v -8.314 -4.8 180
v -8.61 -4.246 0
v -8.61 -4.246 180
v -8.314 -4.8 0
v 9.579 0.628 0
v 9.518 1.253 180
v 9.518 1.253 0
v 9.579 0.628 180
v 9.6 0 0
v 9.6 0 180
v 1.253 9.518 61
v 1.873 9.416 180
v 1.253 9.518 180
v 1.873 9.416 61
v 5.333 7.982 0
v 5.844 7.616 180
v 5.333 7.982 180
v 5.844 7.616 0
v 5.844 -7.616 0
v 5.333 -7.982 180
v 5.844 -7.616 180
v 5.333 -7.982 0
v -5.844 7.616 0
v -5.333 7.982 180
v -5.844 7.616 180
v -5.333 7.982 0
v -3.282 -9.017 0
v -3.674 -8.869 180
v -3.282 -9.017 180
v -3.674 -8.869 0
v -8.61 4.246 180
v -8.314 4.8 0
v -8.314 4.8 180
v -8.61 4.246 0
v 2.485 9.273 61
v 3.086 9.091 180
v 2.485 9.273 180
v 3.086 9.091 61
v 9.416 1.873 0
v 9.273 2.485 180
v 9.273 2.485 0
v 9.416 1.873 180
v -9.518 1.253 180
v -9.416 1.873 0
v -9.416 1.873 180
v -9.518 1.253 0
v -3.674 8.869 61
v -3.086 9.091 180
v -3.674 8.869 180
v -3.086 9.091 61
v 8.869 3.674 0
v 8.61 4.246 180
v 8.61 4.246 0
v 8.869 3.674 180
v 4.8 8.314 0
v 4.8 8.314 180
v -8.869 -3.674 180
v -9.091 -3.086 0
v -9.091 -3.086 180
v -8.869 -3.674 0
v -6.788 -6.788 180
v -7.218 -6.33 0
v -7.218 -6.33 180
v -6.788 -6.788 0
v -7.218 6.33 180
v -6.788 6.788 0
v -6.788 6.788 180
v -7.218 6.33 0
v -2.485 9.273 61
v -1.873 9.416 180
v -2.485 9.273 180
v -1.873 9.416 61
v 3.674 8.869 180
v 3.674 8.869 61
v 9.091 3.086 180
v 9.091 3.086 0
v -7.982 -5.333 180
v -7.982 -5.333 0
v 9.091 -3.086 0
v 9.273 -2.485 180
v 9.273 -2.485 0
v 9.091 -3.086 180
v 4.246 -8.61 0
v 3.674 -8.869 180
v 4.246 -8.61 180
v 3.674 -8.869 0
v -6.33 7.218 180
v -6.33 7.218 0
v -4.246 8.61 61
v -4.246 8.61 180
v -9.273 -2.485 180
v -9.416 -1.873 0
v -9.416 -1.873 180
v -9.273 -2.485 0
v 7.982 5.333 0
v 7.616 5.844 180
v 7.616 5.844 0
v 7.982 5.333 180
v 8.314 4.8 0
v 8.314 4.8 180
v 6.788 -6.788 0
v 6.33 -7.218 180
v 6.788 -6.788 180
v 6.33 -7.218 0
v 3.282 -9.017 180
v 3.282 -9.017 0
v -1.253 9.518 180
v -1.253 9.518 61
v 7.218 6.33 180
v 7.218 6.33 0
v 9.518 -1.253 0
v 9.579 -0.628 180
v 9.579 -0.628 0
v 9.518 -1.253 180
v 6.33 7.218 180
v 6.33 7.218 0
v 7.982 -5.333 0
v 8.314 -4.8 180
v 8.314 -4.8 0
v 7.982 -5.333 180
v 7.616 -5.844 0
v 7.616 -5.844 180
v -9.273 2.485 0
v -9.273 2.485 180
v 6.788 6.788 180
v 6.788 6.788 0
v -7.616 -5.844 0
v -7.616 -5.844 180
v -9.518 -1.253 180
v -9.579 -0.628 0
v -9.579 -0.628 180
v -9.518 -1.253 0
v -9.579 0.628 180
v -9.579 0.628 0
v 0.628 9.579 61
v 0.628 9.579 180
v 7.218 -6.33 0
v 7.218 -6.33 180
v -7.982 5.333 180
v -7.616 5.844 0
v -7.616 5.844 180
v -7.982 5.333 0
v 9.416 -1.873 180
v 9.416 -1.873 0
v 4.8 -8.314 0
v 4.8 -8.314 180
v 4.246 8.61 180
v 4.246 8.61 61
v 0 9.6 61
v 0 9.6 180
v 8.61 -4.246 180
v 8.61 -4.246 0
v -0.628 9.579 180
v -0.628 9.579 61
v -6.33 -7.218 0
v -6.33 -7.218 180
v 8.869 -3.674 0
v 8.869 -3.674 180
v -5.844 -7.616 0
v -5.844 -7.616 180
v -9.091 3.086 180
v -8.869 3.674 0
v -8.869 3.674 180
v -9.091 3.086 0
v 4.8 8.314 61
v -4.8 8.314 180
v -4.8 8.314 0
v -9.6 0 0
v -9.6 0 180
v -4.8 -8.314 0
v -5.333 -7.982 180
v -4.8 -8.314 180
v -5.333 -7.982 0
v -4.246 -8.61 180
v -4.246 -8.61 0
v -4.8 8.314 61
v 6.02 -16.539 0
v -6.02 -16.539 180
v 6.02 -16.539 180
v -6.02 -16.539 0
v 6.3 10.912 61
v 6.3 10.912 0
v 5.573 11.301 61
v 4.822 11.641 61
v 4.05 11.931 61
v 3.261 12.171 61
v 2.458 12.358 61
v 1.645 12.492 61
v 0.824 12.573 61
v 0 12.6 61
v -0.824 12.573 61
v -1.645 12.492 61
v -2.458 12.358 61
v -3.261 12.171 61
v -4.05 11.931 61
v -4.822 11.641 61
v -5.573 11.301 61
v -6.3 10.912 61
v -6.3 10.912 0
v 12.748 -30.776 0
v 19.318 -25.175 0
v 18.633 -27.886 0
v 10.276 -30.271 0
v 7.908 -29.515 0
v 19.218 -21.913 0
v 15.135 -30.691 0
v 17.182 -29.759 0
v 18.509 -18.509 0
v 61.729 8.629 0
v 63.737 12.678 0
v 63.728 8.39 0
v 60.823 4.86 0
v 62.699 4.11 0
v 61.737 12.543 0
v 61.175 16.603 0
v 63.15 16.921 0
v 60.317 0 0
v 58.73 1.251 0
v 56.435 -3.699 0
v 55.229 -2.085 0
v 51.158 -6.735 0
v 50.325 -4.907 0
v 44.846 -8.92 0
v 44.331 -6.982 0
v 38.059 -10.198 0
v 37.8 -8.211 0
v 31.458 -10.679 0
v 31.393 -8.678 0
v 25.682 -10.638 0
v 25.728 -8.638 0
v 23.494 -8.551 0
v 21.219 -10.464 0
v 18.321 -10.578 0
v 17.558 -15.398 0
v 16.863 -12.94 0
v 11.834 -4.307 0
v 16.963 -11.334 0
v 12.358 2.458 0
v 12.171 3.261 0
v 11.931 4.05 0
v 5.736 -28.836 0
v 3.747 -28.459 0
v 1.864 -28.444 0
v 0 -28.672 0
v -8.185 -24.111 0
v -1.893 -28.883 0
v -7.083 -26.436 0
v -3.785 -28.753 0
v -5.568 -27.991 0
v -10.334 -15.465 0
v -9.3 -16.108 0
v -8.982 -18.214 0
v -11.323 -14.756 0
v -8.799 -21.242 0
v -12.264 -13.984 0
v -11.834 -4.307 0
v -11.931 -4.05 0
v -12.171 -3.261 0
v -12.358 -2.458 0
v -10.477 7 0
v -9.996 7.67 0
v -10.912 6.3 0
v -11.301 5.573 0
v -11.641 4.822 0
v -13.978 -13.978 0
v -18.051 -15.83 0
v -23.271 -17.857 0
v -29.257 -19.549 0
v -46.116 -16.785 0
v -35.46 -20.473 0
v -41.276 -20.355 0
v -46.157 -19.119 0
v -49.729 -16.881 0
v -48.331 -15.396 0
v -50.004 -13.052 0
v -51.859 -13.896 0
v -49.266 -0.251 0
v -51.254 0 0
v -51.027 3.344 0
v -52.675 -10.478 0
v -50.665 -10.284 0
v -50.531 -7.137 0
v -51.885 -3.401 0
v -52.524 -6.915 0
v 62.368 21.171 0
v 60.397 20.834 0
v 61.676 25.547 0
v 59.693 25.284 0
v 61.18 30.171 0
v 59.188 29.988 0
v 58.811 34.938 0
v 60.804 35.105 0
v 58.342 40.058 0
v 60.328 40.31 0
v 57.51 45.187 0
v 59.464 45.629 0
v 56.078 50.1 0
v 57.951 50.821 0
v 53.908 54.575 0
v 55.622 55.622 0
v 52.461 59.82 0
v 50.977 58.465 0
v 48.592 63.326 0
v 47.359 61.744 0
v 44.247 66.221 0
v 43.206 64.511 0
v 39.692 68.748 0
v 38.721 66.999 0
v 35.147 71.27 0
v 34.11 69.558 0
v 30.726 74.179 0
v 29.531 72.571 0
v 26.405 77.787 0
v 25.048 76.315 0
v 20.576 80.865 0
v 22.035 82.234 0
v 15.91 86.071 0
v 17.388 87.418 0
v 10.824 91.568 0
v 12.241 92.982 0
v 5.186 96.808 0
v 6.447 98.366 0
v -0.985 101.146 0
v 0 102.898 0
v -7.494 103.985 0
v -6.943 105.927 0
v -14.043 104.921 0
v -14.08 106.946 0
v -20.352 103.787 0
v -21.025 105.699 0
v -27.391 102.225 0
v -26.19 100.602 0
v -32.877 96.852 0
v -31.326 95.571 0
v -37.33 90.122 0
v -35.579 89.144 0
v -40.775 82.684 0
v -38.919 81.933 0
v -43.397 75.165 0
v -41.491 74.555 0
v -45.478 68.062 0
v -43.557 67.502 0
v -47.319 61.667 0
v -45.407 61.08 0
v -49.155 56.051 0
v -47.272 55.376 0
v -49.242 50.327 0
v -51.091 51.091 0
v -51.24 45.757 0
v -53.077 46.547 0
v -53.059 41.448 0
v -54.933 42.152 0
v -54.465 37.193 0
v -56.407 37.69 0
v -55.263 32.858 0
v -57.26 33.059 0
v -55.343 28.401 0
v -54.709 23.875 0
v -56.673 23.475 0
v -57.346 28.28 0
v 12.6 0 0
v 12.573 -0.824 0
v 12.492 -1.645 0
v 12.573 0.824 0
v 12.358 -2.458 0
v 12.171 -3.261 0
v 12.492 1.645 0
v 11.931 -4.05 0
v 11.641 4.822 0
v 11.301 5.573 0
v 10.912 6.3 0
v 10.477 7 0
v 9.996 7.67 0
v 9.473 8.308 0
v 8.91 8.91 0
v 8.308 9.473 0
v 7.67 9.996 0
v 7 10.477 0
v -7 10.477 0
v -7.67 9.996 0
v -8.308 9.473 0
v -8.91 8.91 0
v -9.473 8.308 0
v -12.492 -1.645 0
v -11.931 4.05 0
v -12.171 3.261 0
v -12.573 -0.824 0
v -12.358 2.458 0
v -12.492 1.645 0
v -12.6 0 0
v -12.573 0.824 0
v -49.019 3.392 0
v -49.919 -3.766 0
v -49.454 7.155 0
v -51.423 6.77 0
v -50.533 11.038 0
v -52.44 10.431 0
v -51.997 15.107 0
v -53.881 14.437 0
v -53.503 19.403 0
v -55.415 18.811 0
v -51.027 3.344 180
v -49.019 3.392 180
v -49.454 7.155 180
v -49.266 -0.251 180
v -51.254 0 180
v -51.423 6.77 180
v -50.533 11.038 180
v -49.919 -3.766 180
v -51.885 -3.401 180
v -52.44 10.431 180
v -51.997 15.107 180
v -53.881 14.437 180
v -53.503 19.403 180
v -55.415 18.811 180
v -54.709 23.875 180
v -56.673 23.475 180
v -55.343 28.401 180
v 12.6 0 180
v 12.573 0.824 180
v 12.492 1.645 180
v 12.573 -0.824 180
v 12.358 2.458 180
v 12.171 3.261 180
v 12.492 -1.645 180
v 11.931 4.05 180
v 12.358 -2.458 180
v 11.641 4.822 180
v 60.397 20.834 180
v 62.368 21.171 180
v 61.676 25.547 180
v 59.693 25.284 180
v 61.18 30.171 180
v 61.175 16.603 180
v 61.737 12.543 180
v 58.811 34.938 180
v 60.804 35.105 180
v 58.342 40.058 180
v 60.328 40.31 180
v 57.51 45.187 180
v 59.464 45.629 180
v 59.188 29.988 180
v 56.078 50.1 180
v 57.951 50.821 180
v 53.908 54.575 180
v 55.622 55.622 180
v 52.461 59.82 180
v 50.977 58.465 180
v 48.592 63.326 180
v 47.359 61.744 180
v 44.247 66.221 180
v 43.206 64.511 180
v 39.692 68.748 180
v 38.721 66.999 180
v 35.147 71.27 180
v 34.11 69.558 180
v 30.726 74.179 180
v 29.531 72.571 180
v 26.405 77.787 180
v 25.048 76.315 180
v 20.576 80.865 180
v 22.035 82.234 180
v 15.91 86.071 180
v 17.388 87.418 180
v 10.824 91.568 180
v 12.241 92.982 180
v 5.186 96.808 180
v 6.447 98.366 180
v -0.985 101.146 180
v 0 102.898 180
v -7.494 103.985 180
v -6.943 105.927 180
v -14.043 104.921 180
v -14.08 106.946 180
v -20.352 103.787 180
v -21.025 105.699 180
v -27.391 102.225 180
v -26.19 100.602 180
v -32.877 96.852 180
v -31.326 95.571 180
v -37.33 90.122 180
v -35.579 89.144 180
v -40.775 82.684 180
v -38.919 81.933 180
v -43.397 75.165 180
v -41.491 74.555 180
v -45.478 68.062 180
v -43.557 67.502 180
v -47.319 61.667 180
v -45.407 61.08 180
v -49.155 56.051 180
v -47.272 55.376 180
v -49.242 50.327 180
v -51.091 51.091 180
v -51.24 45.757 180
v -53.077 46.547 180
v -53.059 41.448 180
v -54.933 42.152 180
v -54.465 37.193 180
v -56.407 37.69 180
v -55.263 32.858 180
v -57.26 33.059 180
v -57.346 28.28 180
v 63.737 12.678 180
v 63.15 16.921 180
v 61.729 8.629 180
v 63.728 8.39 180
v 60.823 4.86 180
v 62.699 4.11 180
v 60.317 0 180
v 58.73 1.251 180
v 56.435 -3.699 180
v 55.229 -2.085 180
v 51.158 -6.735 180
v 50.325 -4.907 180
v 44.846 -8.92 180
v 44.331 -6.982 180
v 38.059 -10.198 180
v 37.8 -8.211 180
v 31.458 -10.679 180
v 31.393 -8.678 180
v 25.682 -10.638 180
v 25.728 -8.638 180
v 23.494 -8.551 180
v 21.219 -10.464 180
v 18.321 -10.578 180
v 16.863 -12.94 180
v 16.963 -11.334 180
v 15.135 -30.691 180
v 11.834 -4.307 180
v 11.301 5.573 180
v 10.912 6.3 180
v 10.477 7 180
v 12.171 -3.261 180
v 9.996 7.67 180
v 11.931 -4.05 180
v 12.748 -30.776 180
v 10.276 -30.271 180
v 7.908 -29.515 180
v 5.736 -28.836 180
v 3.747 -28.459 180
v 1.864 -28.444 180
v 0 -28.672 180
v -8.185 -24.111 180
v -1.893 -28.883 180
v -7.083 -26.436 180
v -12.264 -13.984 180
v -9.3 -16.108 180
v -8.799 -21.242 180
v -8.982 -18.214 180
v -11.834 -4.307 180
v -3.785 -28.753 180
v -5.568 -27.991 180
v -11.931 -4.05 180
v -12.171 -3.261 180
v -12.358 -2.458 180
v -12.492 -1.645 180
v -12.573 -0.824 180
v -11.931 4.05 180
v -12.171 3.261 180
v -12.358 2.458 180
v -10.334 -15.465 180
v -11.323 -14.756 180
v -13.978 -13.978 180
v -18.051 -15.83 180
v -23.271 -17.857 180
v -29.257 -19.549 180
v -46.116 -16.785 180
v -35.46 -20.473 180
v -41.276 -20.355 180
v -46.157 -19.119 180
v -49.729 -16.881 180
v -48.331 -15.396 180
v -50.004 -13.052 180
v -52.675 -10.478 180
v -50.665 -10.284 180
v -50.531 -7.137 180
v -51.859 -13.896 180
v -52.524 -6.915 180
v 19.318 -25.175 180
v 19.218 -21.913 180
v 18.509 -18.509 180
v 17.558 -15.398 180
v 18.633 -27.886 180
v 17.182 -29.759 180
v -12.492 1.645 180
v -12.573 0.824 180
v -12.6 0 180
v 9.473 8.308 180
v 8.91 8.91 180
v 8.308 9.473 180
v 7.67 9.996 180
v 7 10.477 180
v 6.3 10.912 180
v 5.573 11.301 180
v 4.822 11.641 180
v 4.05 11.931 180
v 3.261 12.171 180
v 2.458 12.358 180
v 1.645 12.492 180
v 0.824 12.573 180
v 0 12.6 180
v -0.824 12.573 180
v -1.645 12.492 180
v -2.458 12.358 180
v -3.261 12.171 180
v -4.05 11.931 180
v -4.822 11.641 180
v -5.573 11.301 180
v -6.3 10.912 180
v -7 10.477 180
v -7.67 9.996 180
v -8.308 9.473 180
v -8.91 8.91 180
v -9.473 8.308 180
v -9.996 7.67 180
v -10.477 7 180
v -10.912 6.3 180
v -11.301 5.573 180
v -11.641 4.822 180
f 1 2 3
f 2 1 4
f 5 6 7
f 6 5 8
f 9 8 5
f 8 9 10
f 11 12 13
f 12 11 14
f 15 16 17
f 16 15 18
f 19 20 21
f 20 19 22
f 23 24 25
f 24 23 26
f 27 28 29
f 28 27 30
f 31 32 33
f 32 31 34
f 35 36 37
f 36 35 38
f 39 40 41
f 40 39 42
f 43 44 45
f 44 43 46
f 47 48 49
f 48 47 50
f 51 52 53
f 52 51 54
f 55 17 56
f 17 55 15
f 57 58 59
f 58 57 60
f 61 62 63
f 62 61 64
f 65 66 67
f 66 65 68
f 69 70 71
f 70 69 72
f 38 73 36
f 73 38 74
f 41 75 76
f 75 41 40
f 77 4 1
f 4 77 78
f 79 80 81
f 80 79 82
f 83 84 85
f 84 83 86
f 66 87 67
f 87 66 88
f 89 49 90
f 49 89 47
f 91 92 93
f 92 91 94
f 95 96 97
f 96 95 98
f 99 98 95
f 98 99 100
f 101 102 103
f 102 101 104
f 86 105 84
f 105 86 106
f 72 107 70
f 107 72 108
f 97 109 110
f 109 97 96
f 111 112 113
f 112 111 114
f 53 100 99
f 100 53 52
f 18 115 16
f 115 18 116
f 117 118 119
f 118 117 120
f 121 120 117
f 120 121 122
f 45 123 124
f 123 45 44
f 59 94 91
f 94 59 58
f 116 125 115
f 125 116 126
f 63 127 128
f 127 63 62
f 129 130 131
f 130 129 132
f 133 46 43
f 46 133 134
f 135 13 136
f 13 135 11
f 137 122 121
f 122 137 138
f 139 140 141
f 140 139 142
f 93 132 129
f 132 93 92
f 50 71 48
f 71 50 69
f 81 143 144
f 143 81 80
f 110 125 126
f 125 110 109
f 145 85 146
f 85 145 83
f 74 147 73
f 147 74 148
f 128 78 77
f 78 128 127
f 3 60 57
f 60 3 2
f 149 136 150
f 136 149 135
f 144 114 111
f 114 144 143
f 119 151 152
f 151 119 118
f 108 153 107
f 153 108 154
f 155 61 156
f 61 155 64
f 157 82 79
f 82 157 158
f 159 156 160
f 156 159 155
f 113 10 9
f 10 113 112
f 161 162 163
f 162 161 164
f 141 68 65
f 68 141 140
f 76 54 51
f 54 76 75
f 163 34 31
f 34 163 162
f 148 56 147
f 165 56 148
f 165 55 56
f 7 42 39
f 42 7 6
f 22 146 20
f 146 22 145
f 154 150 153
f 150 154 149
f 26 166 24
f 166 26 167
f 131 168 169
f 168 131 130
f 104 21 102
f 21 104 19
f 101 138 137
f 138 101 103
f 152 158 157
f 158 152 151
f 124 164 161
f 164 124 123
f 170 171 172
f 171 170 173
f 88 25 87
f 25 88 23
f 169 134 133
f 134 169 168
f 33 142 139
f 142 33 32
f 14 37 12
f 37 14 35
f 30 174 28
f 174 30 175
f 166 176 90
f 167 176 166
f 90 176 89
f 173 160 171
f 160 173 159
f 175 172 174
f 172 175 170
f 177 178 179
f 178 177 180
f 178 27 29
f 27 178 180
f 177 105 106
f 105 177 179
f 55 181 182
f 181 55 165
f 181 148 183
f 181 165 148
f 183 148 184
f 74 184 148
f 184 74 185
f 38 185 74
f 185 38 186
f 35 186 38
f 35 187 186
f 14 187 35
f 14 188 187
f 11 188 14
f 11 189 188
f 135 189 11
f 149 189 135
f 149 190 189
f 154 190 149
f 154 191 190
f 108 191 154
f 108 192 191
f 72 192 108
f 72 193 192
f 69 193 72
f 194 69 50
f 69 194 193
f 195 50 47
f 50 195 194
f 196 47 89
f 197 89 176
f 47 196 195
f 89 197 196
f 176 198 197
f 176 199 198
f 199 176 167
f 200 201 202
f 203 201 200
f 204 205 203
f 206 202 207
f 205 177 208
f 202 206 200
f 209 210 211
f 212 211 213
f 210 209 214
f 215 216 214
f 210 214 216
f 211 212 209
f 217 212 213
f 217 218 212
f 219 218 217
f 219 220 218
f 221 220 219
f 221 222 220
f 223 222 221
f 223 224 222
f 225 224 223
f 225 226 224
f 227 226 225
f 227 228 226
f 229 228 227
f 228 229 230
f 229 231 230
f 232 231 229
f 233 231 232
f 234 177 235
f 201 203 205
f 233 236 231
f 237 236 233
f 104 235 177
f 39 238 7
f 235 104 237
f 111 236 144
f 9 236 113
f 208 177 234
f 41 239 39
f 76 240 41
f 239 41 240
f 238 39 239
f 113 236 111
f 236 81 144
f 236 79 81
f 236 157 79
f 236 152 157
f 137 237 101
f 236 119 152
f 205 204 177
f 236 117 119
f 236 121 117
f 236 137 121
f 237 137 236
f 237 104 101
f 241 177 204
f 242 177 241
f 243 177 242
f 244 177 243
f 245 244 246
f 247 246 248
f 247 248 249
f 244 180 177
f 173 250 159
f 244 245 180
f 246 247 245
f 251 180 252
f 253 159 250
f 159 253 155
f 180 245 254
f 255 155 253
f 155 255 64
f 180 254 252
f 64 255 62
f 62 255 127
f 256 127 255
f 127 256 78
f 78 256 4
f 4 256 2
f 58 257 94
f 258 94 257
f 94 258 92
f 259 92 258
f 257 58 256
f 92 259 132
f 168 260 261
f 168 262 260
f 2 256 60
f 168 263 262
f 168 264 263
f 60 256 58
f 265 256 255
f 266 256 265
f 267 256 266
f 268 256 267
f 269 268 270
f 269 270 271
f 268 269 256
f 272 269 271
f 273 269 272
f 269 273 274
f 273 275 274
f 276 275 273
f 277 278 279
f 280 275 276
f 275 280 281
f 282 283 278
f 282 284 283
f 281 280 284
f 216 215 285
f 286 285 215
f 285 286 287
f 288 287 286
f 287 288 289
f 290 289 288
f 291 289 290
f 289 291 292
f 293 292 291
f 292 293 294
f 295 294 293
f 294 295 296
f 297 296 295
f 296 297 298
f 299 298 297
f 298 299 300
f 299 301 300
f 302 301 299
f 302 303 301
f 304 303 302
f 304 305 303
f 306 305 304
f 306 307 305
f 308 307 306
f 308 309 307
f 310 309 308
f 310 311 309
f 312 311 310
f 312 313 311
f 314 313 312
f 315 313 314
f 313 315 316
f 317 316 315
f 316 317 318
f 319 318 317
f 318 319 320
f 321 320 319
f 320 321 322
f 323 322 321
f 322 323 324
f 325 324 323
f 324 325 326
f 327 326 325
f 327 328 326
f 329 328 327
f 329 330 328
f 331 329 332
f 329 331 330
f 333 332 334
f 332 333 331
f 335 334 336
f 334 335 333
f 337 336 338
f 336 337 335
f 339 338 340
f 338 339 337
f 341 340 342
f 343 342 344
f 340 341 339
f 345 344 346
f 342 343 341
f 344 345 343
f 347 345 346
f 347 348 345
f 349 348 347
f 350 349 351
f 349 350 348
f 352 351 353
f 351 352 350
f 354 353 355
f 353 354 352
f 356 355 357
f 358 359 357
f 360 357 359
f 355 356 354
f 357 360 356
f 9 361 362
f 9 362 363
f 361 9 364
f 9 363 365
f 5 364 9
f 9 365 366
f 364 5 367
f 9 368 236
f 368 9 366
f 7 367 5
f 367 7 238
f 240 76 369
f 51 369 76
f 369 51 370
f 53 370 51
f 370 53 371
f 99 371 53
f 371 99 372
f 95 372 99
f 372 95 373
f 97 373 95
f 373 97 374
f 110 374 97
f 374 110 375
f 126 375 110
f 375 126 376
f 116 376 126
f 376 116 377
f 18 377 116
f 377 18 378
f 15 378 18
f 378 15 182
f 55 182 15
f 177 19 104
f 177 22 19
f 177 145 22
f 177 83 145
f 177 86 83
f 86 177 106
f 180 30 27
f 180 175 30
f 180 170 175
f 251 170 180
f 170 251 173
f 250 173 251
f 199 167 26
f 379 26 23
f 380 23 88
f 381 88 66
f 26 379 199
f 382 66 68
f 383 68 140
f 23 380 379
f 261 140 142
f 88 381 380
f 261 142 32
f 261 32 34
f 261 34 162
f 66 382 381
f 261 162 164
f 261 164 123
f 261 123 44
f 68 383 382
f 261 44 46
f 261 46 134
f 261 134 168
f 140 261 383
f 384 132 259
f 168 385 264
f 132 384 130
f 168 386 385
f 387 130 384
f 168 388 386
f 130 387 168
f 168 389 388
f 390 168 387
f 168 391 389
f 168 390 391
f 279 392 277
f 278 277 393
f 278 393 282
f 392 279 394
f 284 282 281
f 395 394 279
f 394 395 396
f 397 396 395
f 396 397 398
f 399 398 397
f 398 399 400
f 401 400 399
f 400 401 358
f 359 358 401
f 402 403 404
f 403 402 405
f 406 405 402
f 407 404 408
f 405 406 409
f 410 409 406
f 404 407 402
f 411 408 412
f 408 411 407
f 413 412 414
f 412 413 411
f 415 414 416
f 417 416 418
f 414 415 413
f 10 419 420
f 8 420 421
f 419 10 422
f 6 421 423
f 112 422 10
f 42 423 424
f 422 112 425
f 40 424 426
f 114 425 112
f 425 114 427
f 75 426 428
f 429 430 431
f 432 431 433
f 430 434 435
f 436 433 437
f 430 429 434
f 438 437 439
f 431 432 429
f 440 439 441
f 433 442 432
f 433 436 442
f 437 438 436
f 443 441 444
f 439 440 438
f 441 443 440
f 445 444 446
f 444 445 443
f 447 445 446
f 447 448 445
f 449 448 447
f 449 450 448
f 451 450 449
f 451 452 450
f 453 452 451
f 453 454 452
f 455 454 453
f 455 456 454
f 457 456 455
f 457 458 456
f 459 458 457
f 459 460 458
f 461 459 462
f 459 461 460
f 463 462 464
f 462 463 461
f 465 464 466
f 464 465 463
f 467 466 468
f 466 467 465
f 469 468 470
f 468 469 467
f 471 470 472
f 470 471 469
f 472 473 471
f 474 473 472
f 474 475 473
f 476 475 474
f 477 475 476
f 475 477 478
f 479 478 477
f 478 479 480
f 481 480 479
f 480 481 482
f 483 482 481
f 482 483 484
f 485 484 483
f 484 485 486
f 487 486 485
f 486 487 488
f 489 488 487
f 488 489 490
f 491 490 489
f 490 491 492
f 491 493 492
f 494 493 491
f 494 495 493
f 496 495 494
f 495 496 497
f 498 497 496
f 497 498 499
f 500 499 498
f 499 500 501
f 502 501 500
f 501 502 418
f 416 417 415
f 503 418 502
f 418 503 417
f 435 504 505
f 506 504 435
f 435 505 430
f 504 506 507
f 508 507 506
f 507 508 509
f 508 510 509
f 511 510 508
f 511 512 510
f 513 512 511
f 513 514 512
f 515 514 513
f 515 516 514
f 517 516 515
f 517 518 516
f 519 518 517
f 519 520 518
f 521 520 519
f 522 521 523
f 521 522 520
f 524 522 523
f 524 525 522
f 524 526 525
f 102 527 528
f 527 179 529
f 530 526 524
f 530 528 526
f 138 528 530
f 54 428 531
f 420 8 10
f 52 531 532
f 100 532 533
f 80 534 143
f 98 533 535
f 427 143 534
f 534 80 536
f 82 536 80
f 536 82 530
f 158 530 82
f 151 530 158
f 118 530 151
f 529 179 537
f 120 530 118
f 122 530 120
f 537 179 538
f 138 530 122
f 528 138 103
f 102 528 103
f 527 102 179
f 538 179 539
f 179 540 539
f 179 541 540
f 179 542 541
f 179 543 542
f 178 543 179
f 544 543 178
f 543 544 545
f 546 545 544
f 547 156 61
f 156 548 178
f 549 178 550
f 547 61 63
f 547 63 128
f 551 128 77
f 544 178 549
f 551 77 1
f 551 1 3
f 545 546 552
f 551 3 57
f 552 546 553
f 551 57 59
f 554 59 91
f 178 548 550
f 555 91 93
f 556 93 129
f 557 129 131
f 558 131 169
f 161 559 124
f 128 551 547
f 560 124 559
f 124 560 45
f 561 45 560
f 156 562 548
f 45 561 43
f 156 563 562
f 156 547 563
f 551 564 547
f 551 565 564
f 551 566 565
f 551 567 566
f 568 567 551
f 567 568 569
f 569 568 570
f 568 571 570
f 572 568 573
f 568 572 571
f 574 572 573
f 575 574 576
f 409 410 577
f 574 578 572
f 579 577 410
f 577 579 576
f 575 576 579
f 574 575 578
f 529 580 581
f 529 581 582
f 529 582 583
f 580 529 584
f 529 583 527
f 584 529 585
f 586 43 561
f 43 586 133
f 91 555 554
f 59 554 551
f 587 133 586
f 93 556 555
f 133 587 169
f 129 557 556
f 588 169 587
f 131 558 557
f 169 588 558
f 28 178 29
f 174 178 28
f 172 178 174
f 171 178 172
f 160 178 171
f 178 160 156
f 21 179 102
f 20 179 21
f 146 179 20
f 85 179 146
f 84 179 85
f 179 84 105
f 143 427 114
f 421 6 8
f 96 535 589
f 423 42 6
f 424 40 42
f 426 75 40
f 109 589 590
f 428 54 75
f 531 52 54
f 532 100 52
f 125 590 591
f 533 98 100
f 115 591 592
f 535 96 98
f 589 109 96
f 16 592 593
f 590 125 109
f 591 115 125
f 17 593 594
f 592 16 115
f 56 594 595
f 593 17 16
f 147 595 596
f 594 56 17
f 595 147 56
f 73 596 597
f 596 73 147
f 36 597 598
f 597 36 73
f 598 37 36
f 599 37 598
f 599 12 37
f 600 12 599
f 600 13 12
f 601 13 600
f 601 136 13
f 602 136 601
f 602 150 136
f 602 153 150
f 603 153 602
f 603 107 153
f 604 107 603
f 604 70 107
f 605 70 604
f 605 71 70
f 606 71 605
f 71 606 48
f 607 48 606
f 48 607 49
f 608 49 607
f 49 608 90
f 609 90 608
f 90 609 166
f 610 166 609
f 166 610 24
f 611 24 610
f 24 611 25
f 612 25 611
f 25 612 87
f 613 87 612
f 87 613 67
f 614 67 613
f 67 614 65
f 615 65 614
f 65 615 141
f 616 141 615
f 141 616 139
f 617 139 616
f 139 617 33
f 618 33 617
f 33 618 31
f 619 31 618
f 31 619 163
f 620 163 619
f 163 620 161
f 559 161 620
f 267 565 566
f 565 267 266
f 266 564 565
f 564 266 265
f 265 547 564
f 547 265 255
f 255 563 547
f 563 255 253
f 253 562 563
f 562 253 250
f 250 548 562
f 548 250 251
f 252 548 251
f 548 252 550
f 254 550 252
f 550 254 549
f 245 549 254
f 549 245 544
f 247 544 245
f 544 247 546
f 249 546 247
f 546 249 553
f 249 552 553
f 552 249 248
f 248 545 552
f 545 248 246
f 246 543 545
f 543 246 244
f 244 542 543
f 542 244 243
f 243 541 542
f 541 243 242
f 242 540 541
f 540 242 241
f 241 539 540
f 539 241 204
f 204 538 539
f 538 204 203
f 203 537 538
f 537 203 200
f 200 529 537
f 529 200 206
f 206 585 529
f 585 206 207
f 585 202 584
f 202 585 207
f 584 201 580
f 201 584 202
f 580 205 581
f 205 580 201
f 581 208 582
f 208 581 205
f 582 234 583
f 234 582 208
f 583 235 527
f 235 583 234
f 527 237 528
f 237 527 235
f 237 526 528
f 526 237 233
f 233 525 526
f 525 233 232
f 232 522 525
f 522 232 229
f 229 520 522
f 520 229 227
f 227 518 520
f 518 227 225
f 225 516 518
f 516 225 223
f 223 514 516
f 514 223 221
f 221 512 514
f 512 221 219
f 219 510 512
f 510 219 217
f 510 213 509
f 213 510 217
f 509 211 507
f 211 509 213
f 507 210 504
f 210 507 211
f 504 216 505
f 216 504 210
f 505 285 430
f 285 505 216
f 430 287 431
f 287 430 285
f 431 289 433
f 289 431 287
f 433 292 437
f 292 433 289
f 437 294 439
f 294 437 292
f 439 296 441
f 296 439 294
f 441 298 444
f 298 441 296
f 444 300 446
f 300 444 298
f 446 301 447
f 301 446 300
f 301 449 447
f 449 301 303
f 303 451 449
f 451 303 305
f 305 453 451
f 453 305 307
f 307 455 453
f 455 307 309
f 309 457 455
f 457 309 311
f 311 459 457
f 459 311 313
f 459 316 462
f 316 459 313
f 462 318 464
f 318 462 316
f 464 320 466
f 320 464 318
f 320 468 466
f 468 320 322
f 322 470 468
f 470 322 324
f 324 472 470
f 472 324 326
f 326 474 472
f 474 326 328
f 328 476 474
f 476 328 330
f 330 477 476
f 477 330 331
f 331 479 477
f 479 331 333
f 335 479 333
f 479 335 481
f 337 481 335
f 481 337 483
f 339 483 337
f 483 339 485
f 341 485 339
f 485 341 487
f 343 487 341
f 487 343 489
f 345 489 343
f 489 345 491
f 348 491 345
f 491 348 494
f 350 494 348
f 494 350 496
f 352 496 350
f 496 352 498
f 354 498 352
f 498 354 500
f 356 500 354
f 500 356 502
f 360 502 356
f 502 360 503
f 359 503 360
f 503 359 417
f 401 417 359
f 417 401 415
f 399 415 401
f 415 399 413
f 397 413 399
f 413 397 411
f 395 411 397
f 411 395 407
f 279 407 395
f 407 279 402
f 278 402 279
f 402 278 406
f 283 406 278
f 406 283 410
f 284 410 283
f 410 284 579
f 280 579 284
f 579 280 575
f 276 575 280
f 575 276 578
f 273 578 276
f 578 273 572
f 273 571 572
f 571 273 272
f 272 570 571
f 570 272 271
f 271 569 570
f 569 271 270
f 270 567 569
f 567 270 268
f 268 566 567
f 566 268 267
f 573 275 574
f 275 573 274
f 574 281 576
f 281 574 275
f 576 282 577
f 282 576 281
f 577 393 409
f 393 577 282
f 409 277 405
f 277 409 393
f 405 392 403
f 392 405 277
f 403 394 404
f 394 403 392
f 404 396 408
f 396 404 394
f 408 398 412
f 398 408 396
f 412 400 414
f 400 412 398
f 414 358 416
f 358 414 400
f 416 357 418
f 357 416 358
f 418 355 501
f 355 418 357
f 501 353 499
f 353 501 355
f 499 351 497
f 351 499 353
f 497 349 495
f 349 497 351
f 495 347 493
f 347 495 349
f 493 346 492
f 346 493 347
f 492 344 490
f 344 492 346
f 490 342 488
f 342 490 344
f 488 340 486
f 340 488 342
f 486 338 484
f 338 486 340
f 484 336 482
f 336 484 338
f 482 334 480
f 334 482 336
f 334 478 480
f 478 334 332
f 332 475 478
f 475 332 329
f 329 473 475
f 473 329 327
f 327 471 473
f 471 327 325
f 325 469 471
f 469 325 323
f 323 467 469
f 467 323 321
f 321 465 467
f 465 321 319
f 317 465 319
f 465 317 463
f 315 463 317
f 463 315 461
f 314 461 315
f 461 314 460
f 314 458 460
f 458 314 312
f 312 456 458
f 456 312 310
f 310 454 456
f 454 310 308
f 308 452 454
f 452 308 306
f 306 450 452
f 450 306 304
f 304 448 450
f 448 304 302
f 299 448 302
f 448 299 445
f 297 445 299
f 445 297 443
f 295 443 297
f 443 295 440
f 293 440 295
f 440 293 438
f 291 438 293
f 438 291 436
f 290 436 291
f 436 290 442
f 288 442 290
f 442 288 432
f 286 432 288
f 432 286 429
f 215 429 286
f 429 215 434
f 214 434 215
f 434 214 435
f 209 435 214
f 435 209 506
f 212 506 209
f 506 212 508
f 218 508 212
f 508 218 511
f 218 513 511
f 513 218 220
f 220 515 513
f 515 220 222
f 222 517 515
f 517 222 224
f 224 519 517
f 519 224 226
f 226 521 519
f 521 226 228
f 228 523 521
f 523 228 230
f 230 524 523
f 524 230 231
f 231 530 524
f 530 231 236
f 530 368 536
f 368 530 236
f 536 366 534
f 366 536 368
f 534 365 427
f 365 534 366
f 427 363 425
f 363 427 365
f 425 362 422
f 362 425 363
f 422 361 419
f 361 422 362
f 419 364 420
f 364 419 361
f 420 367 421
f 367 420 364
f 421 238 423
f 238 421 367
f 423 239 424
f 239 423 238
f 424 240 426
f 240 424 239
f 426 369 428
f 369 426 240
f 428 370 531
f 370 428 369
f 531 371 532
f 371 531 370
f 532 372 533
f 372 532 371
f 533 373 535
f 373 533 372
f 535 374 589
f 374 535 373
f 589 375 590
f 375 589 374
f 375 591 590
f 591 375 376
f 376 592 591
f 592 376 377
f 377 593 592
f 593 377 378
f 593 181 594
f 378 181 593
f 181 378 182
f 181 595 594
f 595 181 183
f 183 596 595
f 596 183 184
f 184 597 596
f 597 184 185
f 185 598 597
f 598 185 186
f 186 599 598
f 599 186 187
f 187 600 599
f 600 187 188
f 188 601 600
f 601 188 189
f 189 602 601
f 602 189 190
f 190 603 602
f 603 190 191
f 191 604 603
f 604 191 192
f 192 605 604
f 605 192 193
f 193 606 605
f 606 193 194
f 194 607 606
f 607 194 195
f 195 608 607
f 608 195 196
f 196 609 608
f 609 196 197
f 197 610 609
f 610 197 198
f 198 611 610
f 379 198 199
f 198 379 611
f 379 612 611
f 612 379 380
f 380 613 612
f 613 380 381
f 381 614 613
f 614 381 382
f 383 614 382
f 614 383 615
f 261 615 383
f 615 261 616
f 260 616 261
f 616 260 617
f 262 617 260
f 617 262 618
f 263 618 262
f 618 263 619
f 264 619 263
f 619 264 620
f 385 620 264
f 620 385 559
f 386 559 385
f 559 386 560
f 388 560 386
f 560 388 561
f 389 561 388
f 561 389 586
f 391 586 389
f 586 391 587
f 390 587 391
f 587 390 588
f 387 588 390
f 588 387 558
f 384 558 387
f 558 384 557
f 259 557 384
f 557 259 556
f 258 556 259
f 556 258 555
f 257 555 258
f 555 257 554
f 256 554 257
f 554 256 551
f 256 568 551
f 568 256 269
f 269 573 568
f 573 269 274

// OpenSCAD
// Lampenschirm für Stehlampe – organischer, wellenförmiger Querschnitt
// mit Klemmkragen, der in die Form integriert ist (keine D-Form mehr)
// Alle Maße in Millimetern (Regel: units-mm)
//
// Kontext: context/printer.md, context/tolerances.md und context/materials.md
// waren zum Zeitpunkt der Modellierung leer (siehe Regel: context-first).
// Annahmen aus dem Design-Dialog (siehe auch 001/002):
//   - Baubett >= 200mm Z-Höhe vorhanden -> Schirm wird als ein Teil,
//     stehend, in voller Höhe gedruckt.
//   - Klemmkragen als offener Federclip (C-Ring): Innendurchmesser 0.8mm
//     unter Stangendurchmesser (19.2mm ID auf 20mm Stange) für Vorspannung.
//   - E14-Fassung wird separat an der Stange montiert.
//
// Änderungen gegenüber 003 (Nutzer-Feedback: "Klemme scheint nicht mehr mit
// dem Schirm verbunden zu sein"):
//   - Ursache war ein echter Fehler (nicht nur Vorschau): offset(delta=-wall_t)
//     auf der stark welligen/konkaven Kontur verhielt sich bei den engen
//     Wellentälern unvorhersehbar, wodurch zwischen Klemme und Außenwand ein
//     durchgehender Hohlraum-Ring übrig blieb (bestätigt über CLI-Kompilierung:
//     "Volumes: 3" statt der erwarteten 2 = zwei unverbundene Körper).
//   - Neuer Ansatz: statt die Klemmzone über eine Offset-Subtraktion
//     freizurechnen, wird ein Keil (boss_bridge) direkt aus der Original-
//     Außenkontur (organic_outline, kein offset()) ausgeschnitten und komplett
//     massiv gefüllt. Das garantiert eine feste Verbindung zur Außenwand,
//     unabhängig vom Offset-Verhalten bei starker Welligkeit.

// ---- Parameter ----
shade_height = 180;   // Gesamthöhe des Schirms
wall_t       = 2;     // Wandstärke Schirm (dünn für Lichtdurchlässigkeit)

rod_d      = 20;                 // Durchmesser der Metallstange
rod_r      = rod_d / 2;
clip_id    = 19.2;               // Innendurchmesser Klemmkragen (Vorspannung, ~0.8mm Untermaß)
clip_r_in  = clip_id / 2;
clip_wall  = 3;                  // Wandstärke Klemmkragen (dicker als Schirmwand, für Klemmkraft)
clip_r_out = clip_r_in + clip_wall;
clip_gap_deg = 40;               // Öffnungswinkel des C-Rings (Montagespalt, zeigt nach -Y)

socket_slot_deg    = 60;              // Öffnungswinkel des Fassungs-Schlitzes (Innenseite, +Y) - Annahme
socket_slot_height = shade_height / 3; // unteres Drittel der Klemme ist auf der Innenseite offen

// Organische Grundform (Fourier-Basis, Radius in mm ab Stangenmitte):
// front (θ=90°, +Y) ≈ 95mm, Seiten (θ=0°/180°) ≈ 50mm, Rückseite (θ=270°, -Y) ≈ 25mm
base_a0 = 55;
base_a1 = 35;
base_a2 = 5;

// Wellen-Überlagerung für den organischen/wellenförmigen Look
wave_amp1 = 9;   wave_freq1 = 4;  wave_phase1 = 40;
wave_amp2 = 5;   wave_freq2 = 7;  wave_phase2 = 115;

min_r = clip_r_out + 6;          // harte Untergrenze: Kontur darf den Klemmkragen nie schneiden
bridge_deg = 140;                // Öffnungswinkel des massiven Verbindungskeils, zentriert auf die Rückseite (270°)

$fn = 96;

// Radius der organischen Kontur in Abhängigkeit vom Winkel θ (Grad)
function organic_r(theta) =
    let(phi = theta - 90)
    let(base = base_a0 + base_a1 * cos(phi) + base_a2 * cos(2 * phi))
    let(wave = wave_amp1 * sin(wave_freq1 * theta + wave_phase1)
             + wave_amp2 * sin(wave_freq2 * theta + wave_phase2))
    max(base + wave, min_r);

// Geschlossenes 2D-Profil der organischen Außenkontur
module organic_outline() {
    step = 360 / $fn;
    polygon(points = [
        for (t = [0 : step : 360 - step])
            [organic_r(t) * cos(t), organic_r(t) * sin(t)]
    ]);
}

// Keilförmiger 2D-Ausschnitt, zentriert auf Winkel 0
module pie_wedge_2d(radius, angle_deg) {
    a = angle_deg / 2;
    polygon(points = [
        [0, 0],
        [radius * cos(a), radius * sin(a)],
        [radius * cos(-a), radius * sin(-a)]
    ]);
}

// Massiver Verbindungskeil zwischen Klemmkragen und Außenwand: die Original-
// Außenkontur (kein offset()) geschnitten auf einen Sektor um die Rückseite,
// komplett massiv gefüllt von der Mitte bis zur Außenwand. Berührt die
// Außenkontur direkt (garantierte Verbindung) und überdeckt den kompletten
// Klemmkragen (r bis clip_r_out), da bridge_deg > clip_gap_deg.
module boss_bridge_2d() {
    intersection() {
        organic_outline();
        rotate([0, 0, 270])
            pie_wedge_2d(300, bridge_deg);
    }
}

// Voller Klemmkragen-Rohling (Bohrung/Spalt werden erst in 3D herausgeschnitten)
module collar_disk_2d() {
    circle(r = clip_r_out);
}

// 2D-Profil der Wand: normale 2mm-Schale überall + massiver Klemmkragen-
// Rohling + massiver Verbindungskeil zur Rückseite (garantiert verbunden)
module shell_with_boss_2d() {
    union() {
        difference() {
            organic_outline();
            offset(delta = -wall_t)
                organic_outline();
        }
        collar_disk_2d();
        boss_bridge_2d();
    }
}

module organic_shell() {
    linear_extrude(height = shade_height)
        shell_with_boss_2d();
}

// Radialer Schlitz von z0 bis z1, in Richtung facing_deg ausgerichtet
module radial_slot(radius, angle_deg, facing_deg, z0, z1) {
    translate([0, 0, z0])
        rotate([0, 0, facing_deg])
            linear_extrude(z1 - z0)
                pie_wedge_2d(radius, angle_deg);
}

// Alle Ausschnitte für die Klemme: durchgehende Stangenbohrung + Montagespalt
// (volle Höhe, -Y) + Fassungs-Schlitz (unteres Drittel, +Y)
module clamp_cutouts() {
    union() {
        translate([0, 0, -1])
            cylinder(r = clip_r_in, h = shade_height + 2);

        radial_slot(clip_r_out + 5, clip_gap_deg, 270, -1, shade_height + 1);

        radial_slot(clip_r_out + 5, socket_slot_deg, 90, -1, socket_slot_height + 1);
    }
}

// render() erzwingt die vollständige (exakte) Boolesche Berechnung statt der
// schnellen OpenCSG-Live-Vorschau, damit die Klemme auch in der OpenSCAD-
// Vorschau (F5) korrekt dargestellt wird.
render(convexity = 10)
    difference() {
        organic_shell();
        clamp_cutouts();
    }
